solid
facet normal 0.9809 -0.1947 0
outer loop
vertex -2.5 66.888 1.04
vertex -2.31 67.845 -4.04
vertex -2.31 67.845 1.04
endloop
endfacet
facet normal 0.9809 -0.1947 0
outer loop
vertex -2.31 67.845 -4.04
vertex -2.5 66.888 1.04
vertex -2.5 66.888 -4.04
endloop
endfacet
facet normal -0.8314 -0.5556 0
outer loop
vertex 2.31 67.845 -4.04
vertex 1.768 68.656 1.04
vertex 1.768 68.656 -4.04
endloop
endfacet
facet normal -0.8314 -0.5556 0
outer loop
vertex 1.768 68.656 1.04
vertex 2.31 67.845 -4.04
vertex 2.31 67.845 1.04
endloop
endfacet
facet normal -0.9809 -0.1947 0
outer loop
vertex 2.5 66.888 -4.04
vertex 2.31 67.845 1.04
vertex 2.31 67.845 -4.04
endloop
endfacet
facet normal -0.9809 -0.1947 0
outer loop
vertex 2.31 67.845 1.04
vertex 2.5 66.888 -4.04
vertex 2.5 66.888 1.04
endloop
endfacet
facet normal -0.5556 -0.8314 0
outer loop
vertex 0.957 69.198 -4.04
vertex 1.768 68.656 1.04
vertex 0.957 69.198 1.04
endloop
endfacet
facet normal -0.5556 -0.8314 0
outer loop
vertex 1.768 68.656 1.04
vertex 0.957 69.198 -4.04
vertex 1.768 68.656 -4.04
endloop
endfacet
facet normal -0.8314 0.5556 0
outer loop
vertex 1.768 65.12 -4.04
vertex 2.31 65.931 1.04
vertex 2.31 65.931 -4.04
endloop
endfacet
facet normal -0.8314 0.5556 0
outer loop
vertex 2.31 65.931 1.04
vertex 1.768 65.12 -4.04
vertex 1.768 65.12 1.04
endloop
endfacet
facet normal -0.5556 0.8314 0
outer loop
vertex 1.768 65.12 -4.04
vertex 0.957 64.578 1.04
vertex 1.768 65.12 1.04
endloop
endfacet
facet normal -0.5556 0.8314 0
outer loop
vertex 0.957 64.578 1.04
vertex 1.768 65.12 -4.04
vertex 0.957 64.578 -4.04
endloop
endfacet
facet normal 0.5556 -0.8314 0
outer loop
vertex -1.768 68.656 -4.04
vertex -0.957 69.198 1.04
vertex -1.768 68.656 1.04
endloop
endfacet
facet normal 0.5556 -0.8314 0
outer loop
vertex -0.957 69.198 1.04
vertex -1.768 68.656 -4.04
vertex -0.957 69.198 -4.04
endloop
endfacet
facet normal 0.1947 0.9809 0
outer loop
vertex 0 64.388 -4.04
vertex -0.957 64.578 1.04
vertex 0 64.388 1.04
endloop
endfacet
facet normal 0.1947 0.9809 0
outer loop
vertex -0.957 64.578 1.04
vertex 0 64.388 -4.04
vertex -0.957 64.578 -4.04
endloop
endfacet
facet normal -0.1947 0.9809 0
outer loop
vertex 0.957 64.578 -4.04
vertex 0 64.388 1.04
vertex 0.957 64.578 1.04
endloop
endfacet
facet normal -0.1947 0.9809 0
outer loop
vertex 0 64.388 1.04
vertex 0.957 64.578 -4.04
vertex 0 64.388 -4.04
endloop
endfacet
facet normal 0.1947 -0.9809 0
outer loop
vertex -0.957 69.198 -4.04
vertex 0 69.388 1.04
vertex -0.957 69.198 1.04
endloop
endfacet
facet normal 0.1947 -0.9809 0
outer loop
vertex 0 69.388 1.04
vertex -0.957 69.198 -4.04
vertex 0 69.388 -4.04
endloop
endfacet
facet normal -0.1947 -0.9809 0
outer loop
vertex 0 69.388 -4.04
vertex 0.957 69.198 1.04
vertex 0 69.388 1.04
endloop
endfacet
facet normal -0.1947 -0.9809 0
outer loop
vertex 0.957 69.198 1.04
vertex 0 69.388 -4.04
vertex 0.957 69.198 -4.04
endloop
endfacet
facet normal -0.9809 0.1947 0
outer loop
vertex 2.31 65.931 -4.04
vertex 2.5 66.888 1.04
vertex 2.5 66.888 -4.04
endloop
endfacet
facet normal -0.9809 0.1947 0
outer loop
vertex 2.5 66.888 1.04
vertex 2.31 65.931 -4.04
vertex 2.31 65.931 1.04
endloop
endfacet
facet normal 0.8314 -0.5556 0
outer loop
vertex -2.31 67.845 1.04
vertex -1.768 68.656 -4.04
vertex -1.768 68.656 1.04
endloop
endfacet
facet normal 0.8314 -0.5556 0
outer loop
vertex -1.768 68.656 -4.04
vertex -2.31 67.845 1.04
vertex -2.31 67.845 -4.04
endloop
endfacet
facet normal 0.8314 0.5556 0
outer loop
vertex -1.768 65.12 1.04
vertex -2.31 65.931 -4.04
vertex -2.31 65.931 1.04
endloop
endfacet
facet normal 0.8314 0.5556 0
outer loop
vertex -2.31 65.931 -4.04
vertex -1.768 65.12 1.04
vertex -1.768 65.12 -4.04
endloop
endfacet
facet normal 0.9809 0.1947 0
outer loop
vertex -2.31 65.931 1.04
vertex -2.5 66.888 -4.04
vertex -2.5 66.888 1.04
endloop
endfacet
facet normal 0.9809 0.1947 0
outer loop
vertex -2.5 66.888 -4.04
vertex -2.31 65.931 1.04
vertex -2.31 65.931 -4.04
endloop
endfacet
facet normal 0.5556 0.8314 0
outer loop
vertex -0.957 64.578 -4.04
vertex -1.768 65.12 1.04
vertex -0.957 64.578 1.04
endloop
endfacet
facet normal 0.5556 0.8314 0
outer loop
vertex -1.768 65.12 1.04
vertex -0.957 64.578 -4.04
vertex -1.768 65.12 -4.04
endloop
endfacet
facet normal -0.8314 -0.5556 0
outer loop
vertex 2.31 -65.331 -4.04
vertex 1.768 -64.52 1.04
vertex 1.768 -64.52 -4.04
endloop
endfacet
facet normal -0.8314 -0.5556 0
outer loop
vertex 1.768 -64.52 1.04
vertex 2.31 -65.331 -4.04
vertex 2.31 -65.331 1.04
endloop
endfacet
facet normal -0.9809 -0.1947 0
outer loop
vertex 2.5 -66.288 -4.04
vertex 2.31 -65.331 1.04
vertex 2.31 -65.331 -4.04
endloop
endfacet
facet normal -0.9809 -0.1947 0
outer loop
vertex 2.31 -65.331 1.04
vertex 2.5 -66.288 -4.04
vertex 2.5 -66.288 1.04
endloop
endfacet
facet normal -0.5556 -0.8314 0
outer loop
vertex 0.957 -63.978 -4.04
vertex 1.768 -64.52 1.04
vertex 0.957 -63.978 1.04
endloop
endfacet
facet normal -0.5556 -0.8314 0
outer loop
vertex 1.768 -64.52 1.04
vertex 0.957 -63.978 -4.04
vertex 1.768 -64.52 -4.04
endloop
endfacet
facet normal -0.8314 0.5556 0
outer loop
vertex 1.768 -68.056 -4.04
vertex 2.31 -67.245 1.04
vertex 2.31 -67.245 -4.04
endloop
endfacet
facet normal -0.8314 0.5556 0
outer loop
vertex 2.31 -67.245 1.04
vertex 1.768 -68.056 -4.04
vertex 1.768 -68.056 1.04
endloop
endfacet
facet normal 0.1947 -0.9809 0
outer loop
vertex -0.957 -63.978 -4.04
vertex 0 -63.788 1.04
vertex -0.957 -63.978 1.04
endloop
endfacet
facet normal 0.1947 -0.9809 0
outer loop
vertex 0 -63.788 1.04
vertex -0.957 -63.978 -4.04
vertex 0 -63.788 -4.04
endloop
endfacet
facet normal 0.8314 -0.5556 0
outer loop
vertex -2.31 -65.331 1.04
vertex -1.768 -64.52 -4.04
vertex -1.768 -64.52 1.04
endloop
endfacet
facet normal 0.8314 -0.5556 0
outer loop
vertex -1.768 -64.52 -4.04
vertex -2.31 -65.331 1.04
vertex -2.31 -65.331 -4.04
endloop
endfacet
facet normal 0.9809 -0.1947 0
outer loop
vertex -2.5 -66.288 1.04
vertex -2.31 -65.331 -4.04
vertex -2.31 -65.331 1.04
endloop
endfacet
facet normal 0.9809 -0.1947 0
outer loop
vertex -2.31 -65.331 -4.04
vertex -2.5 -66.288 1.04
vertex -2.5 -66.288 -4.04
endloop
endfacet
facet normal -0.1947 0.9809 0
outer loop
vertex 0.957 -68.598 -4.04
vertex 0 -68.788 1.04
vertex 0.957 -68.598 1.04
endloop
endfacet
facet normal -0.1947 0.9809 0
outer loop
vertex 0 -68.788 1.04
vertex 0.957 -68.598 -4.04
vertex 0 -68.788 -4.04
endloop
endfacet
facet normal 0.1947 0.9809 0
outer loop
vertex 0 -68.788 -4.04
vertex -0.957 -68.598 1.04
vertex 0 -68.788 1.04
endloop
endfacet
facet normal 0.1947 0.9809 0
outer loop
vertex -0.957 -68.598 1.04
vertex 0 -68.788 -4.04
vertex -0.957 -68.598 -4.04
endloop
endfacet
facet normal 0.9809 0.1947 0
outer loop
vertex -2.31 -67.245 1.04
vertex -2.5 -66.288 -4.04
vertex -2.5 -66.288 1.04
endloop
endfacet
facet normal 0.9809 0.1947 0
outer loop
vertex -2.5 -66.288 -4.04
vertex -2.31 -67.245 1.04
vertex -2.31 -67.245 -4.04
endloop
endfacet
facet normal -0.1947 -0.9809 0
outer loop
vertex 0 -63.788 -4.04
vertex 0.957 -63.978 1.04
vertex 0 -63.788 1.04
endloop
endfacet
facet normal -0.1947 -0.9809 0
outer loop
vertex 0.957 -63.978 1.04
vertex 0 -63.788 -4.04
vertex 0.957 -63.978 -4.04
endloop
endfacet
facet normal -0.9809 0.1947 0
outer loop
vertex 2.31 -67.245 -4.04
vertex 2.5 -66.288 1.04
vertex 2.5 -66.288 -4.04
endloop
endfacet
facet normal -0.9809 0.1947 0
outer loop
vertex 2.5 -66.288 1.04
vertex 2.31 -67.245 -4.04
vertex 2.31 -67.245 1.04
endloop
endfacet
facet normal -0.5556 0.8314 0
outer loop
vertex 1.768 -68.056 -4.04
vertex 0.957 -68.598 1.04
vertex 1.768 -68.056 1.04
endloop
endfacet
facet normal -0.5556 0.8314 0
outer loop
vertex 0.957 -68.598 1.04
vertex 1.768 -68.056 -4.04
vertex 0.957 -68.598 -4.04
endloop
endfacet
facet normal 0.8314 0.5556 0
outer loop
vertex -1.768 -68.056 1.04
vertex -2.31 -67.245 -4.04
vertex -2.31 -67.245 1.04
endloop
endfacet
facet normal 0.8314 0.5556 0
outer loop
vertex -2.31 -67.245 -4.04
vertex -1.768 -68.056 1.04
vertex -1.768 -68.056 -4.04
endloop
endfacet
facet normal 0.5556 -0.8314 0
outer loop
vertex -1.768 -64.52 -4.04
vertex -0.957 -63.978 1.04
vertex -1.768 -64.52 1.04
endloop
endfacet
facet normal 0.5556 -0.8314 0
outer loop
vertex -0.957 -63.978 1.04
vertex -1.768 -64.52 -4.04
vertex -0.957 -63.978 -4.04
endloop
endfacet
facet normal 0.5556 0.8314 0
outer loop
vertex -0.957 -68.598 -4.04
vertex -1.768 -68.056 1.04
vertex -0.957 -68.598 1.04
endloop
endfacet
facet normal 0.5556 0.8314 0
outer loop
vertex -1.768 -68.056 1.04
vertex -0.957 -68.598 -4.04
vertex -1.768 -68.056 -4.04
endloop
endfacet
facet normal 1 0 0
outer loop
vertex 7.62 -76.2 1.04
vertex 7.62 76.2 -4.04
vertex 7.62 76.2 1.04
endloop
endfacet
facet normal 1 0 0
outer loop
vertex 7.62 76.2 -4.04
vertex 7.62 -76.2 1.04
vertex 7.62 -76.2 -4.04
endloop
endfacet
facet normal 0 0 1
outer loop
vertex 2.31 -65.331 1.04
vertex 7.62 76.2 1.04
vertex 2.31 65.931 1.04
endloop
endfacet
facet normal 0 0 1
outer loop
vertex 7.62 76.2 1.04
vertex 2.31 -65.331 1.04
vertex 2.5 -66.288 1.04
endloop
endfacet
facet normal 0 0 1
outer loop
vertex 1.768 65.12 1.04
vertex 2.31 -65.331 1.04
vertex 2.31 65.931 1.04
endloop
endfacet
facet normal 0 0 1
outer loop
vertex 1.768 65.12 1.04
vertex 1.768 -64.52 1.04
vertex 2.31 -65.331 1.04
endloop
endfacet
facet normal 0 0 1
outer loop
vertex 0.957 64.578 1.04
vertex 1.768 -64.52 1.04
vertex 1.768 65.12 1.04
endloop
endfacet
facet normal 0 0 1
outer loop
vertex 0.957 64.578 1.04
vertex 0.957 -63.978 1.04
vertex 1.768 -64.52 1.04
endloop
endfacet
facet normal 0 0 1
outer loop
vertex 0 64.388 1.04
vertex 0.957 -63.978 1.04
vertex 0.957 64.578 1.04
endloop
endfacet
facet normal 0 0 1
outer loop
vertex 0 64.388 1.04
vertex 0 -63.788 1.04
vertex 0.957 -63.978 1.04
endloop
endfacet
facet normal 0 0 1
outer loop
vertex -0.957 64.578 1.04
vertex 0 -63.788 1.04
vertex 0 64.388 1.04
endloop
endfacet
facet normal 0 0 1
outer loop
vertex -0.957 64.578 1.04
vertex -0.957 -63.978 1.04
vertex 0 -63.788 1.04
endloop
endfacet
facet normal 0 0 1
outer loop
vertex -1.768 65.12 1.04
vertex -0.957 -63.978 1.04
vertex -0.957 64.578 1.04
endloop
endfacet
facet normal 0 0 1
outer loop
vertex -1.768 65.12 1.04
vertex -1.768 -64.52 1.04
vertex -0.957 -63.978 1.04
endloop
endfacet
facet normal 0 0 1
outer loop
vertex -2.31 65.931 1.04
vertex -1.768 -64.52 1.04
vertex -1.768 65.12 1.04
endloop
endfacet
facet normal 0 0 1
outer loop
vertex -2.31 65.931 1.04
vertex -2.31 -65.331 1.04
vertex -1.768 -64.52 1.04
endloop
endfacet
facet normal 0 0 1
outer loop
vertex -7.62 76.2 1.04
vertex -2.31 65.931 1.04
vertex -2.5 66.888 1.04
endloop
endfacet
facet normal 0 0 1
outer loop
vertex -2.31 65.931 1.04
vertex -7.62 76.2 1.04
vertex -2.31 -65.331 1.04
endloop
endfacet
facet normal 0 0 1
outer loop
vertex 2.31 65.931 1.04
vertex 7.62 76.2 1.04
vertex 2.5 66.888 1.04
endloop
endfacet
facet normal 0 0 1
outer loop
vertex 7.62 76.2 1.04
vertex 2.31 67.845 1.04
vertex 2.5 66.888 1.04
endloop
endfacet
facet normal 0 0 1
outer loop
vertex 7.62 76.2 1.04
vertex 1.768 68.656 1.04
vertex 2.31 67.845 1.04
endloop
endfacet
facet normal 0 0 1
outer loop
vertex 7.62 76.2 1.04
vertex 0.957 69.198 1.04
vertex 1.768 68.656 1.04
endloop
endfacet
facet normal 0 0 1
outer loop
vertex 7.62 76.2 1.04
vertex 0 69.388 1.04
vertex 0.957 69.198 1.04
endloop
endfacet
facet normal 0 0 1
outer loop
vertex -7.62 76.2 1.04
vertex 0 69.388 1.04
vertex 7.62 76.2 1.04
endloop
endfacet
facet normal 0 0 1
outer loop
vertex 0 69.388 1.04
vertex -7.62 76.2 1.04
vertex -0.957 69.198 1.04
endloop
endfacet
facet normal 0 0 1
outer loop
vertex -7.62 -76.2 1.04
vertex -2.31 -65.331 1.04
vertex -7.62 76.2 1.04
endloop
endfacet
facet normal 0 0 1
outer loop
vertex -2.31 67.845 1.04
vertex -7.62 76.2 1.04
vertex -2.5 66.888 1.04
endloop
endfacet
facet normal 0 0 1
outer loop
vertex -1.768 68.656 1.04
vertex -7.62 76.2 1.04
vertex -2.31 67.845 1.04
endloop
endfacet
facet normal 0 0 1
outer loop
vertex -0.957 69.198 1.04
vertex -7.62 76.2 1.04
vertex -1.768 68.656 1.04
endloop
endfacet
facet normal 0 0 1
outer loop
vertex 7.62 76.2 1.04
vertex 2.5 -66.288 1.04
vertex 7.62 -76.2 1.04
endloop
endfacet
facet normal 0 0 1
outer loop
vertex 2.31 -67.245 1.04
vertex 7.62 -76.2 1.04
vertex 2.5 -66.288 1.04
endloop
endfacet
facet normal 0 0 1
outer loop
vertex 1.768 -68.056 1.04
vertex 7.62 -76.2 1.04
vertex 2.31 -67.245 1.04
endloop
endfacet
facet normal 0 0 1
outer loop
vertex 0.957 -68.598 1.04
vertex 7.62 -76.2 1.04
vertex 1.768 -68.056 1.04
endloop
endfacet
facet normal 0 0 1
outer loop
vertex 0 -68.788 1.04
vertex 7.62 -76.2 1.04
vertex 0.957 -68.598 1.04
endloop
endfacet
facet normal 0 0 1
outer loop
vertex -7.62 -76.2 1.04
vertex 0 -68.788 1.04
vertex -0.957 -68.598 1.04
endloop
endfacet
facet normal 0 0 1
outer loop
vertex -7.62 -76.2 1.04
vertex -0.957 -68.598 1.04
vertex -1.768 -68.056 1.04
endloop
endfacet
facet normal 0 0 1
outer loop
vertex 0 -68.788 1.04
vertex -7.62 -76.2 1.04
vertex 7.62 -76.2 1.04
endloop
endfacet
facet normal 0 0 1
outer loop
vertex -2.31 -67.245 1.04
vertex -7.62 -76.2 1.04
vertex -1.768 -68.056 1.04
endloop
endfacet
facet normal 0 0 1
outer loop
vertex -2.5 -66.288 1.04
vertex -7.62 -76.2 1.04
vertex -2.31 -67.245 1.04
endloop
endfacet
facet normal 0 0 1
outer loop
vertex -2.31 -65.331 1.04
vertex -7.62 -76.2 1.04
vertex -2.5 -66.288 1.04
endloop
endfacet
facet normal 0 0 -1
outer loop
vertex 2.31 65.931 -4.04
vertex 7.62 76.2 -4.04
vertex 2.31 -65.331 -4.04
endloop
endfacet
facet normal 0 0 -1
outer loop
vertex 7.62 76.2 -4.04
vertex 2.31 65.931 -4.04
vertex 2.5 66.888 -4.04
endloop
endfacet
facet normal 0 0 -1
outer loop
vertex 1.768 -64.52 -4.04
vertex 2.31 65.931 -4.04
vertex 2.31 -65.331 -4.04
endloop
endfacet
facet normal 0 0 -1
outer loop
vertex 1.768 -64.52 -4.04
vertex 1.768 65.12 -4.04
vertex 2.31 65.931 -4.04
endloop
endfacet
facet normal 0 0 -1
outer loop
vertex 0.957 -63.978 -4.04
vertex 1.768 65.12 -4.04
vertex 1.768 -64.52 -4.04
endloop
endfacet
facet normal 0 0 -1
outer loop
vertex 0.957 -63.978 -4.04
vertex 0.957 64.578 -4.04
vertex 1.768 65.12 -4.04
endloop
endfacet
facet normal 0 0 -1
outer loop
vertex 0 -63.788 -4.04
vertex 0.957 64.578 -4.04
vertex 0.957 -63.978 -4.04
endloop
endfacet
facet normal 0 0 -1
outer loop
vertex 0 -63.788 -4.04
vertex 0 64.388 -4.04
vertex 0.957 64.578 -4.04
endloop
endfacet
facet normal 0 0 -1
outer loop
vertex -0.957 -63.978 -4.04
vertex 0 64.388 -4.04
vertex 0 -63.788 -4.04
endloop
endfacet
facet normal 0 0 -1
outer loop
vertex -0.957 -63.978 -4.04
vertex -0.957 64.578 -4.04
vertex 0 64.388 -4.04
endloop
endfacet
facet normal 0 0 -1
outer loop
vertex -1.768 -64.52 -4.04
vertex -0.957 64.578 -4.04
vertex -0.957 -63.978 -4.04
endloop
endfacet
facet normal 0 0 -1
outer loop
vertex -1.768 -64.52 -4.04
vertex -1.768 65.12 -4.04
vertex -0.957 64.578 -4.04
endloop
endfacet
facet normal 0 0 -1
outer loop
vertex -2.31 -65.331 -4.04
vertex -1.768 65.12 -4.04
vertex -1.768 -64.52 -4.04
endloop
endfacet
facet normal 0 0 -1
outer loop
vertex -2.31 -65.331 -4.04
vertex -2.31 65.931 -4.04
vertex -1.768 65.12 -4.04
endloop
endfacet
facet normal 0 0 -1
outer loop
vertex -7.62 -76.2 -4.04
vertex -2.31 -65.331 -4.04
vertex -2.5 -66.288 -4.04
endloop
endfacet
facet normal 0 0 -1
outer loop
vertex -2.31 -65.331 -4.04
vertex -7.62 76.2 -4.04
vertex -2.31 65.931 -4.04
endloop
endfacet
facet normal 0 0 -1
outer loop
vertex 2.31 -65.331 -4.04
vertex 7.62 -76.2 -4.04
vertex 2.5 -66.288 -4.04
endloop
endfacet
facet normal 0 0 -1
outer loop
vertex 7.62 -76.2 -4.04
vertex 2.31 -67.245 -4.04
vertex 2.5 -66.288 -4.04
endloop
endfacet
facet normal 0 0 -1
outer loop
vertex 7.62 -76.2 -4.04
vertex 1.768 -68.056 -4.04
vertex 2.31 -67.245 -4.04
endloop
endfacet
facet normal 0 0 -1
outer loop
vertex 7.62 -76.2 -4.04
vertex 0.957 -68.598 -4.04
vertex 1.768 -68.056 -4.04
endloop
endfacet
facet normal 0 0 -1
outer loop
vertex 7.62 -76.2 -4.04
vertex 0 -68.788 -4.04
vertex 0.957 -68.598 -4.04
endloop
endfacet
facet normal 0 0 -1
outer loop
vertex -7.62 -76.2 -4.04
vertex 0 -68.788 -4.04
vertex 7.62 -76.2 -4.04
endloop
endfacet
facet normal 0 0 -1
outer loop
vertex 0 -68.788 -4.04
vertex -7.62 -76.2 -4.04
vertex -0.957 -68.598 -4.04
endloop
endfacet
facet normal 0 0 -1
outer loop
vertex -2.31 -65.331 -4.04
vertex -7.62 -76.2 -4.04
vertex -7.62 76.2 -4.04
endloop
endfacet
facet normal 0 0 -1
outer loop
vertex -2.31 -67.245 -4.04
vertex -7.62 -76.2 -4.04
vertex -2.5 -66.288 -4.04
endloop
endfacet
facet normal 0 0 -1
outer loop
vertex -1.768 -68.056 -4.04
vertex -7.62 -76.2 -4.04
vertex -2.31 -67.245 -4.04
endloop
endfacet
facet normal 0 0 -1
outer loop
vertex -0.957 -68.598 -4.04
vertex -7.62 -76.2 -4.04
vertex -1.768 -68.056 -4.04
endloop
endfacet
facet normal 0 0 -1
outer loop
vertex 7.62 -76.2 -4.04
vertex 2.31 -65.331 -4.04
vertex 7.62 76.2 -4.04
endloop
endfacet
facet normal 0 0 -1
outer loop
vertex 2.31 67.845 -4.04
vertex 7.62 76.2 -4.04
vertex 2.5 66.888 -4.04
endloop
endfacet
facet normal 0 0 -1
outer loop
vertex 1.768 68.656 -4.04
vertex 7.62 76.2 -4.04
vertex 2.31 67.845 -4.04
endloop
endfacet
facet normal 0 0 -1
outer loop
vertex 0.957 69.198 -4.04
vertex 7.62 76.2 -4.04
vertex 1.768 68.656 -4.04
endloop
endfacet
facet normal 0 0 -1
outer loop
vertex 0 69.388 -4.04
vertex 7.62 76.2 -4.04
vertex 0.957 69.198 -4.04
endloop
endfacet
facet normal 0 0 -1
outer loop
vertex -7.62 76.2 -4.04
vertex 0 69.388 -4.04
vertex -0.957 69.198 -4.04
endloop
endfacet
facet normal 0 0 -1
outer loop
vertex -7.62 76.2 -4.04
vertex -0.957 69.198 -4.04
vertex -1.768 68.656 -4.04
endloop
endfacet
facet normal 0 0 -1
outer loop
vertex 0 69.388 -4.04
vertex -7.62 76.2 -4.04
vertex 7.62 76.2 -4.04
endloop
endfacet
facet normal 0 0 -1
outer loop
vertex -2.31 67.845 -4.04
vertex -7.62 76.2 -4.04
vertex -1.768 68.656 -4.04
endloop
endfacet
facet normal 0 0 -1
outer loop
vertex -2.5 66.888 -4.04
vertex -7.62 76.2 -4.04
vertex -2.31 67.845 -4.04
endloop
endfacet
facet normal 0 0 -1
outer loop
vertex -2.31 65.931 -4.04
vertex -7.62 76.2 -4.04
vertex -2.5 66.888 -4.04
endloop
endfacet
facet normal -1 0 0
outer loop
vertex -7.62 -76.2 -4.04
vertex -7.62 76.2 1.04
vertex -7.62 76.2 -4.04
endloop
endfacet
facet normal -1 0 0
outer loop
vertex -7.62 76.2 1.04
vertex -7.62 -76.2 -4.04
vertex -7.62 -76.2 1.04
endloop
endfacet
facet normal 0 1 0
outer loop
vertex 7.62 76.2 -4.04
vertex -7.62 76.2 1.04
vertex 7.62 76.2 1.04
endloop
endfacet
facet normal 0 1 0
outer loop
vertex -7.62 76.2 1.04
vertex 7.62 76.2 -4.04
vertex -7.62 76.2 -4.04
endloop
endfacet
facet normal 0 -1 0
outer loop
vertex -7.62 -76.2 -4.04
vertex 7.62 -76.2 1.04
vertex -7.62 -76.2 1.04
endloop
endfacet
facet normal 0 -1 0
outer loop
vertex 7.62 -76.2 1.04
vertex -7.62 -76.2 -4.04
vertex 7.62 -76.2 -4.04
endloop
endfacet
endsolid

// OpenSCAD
// file: hdim.scad
module hdim(x1 = 10, x2 = 20, y = 10, dimline_lenght = 9.0) 
{
    dimline_overlap = 0.5;
    dimline_width = 0.3;
    text_size = 2;
    
    // rotate([0,90,rotation]) 
    color([0,0,0])
    // translate([0,0,hex_length*0.5]) 
    {
        translate([x1,y-dimline_lenght/2,0]) 
            square([dimline_width, 
                dimline_lenght + 2*dimline_overlap], 
                center=true, $fs=0.01);
                
        translate([x2,y-dimline_lenght/2,0]) 
            square([dimline_width, 
                dimline_lenght + 2*dimline_overlap], 
                center=true, $fs=0.01);

        translate([(x1+x2)/2,y-dimline_lenght,0]) 
            square([x2-x1, 
                dimline_width], 
                center=true, $fs=0.01);
        
        translate([(x1+x2)/2,y-dimline_lenght-dimline_overlap-text_size/2,0]) 
            text(str(x2-x1), size = text_size, 
                halign = "center",valign = "center");
    }
}

hdim();
// file: bedleg.scad
module bedleg(cw_w = 5.08, cw_h = 15.24, mirror = true, leglength=25.7,leg_angle=0) 
{
    translate([-cw_w/2,0, -cw_w/2]) 
    rotate([0,leg_angle,0])
    translate([cw_w/2,0, cw_w/2]) 
    {
        if (mirror) 
        {
            translate([-cw_w,0,-leglength]) 
                oneleg(cw_w, cw_h, leglength);
        }
        else {
            translate([0,0,-leglength])
                oneleg(cw_w, cw_h, leglength);

        }
    }
}

module oneleg(cw_w = 5.08, cw_h = 15.24, leglength=25.7)
{
    indent_w = 2;
    indent_h = cw_w + 1;
    
    color([0.40,0.30,0.16,1.0])
    translate([cw_w,0,leglength])
    rotate([-90,0,90])
    linear_extrude(cw_w)
    polygon(points=[[indent_w,0],[cw_h-indent_w,0],[cw_h-indent_w, indent_h],[cw_h, indent_h],[cw_h, leglength],[0,leglength],[0,indent_h], [indent_w,indent_h]]);

    color([0.8,0.8,0.5,1.0])
    {
        translate([0,cw_h/2,0]) 
        rotate([90,90,-90])
        text(str(0.1 * round(10*leglength)), size = 6, 
            halign = "right",valign = "center"); 
        translate([cw_w,cw_h/2,0]) 
        rotate([90,90,90])
        text(str(0.1 * round(10*leglength)), size = 6, 
            halign = "right",valign = "center");
    }
}    

bedleg();
// main file
use <bedleg.scad> 
use <hdim.scad> 
extra_leg_spacing = 1.5;
bighole_diam = 5.0;
bighole_spacing = 0.3;
bighole_pos_coeff = 1.40;

module bedsupport(matress_length=190, mattress_width = 152.4, cw_w = 5.08, cw_h = 15.24, jw_w=4.80, jw_h = 4.8, groove_depth = 1.5, bighole=true) 
{
    translate([0,0,-cw_h/2+cw_w-groove_depth+cw_w/2])
    {
        difference()
        {
            color([0.71,0.40,0.11])
                cube([cw_h, mattress_width, cw_w],center=true);
            
            if (bighole)
            {
                translate([0,mattress_width/2 - bighole_pos_coeff * cw_w 
                    - bighole_diam/2 + bighole_spacing,0])
                rotate([0,0,0]) 
                cylinder(h=cw_w+0.2,r=bighole_diam/2,center = true, $fn = 16);
                
                translate([0,-mattress_width/2 + bighole_pos_coeff * cw_w 
                    + bighole_diam/2+bighole_spacing,0])
                rotate([0,0,0]) 
                cylinder(h=cw_w+0.2,r=bighole_diam/2,center = true, $fn = 16);
            }
        }
    
        color([0.8,0.8,0.5,1.0])
        {
            translate([0,0,cw_w/2]) 
            rotate([0,0,90])
            text(str(0.1 * round(10*mattress_width)), size = 6, 
                halign = "center",valign = "center"); 
            translate([0, 0,-cw_w/2]) 
            rotate([180,0,90])
            text(str(0.1 * round(10*mattress_width)), size = 6, 
                halign = "center",valign = "center");
        }
        
        if (bighole)
        {
            translate([0,0, cw_w/2]) rotate([0,0,90])
            hdim(mattress_width/2 - bighole_pos_coeff * cw_w - bighole_diam/2 + bighole_spacing, 
                mattress_width/2, 0);
        }
        
        translate([0,0, cw_w/2]) rotate([0,0,90])
            hdim(-mattress_width/2, 
                mattress_width/2, 0, 14);
    }
}

bedsupport();
